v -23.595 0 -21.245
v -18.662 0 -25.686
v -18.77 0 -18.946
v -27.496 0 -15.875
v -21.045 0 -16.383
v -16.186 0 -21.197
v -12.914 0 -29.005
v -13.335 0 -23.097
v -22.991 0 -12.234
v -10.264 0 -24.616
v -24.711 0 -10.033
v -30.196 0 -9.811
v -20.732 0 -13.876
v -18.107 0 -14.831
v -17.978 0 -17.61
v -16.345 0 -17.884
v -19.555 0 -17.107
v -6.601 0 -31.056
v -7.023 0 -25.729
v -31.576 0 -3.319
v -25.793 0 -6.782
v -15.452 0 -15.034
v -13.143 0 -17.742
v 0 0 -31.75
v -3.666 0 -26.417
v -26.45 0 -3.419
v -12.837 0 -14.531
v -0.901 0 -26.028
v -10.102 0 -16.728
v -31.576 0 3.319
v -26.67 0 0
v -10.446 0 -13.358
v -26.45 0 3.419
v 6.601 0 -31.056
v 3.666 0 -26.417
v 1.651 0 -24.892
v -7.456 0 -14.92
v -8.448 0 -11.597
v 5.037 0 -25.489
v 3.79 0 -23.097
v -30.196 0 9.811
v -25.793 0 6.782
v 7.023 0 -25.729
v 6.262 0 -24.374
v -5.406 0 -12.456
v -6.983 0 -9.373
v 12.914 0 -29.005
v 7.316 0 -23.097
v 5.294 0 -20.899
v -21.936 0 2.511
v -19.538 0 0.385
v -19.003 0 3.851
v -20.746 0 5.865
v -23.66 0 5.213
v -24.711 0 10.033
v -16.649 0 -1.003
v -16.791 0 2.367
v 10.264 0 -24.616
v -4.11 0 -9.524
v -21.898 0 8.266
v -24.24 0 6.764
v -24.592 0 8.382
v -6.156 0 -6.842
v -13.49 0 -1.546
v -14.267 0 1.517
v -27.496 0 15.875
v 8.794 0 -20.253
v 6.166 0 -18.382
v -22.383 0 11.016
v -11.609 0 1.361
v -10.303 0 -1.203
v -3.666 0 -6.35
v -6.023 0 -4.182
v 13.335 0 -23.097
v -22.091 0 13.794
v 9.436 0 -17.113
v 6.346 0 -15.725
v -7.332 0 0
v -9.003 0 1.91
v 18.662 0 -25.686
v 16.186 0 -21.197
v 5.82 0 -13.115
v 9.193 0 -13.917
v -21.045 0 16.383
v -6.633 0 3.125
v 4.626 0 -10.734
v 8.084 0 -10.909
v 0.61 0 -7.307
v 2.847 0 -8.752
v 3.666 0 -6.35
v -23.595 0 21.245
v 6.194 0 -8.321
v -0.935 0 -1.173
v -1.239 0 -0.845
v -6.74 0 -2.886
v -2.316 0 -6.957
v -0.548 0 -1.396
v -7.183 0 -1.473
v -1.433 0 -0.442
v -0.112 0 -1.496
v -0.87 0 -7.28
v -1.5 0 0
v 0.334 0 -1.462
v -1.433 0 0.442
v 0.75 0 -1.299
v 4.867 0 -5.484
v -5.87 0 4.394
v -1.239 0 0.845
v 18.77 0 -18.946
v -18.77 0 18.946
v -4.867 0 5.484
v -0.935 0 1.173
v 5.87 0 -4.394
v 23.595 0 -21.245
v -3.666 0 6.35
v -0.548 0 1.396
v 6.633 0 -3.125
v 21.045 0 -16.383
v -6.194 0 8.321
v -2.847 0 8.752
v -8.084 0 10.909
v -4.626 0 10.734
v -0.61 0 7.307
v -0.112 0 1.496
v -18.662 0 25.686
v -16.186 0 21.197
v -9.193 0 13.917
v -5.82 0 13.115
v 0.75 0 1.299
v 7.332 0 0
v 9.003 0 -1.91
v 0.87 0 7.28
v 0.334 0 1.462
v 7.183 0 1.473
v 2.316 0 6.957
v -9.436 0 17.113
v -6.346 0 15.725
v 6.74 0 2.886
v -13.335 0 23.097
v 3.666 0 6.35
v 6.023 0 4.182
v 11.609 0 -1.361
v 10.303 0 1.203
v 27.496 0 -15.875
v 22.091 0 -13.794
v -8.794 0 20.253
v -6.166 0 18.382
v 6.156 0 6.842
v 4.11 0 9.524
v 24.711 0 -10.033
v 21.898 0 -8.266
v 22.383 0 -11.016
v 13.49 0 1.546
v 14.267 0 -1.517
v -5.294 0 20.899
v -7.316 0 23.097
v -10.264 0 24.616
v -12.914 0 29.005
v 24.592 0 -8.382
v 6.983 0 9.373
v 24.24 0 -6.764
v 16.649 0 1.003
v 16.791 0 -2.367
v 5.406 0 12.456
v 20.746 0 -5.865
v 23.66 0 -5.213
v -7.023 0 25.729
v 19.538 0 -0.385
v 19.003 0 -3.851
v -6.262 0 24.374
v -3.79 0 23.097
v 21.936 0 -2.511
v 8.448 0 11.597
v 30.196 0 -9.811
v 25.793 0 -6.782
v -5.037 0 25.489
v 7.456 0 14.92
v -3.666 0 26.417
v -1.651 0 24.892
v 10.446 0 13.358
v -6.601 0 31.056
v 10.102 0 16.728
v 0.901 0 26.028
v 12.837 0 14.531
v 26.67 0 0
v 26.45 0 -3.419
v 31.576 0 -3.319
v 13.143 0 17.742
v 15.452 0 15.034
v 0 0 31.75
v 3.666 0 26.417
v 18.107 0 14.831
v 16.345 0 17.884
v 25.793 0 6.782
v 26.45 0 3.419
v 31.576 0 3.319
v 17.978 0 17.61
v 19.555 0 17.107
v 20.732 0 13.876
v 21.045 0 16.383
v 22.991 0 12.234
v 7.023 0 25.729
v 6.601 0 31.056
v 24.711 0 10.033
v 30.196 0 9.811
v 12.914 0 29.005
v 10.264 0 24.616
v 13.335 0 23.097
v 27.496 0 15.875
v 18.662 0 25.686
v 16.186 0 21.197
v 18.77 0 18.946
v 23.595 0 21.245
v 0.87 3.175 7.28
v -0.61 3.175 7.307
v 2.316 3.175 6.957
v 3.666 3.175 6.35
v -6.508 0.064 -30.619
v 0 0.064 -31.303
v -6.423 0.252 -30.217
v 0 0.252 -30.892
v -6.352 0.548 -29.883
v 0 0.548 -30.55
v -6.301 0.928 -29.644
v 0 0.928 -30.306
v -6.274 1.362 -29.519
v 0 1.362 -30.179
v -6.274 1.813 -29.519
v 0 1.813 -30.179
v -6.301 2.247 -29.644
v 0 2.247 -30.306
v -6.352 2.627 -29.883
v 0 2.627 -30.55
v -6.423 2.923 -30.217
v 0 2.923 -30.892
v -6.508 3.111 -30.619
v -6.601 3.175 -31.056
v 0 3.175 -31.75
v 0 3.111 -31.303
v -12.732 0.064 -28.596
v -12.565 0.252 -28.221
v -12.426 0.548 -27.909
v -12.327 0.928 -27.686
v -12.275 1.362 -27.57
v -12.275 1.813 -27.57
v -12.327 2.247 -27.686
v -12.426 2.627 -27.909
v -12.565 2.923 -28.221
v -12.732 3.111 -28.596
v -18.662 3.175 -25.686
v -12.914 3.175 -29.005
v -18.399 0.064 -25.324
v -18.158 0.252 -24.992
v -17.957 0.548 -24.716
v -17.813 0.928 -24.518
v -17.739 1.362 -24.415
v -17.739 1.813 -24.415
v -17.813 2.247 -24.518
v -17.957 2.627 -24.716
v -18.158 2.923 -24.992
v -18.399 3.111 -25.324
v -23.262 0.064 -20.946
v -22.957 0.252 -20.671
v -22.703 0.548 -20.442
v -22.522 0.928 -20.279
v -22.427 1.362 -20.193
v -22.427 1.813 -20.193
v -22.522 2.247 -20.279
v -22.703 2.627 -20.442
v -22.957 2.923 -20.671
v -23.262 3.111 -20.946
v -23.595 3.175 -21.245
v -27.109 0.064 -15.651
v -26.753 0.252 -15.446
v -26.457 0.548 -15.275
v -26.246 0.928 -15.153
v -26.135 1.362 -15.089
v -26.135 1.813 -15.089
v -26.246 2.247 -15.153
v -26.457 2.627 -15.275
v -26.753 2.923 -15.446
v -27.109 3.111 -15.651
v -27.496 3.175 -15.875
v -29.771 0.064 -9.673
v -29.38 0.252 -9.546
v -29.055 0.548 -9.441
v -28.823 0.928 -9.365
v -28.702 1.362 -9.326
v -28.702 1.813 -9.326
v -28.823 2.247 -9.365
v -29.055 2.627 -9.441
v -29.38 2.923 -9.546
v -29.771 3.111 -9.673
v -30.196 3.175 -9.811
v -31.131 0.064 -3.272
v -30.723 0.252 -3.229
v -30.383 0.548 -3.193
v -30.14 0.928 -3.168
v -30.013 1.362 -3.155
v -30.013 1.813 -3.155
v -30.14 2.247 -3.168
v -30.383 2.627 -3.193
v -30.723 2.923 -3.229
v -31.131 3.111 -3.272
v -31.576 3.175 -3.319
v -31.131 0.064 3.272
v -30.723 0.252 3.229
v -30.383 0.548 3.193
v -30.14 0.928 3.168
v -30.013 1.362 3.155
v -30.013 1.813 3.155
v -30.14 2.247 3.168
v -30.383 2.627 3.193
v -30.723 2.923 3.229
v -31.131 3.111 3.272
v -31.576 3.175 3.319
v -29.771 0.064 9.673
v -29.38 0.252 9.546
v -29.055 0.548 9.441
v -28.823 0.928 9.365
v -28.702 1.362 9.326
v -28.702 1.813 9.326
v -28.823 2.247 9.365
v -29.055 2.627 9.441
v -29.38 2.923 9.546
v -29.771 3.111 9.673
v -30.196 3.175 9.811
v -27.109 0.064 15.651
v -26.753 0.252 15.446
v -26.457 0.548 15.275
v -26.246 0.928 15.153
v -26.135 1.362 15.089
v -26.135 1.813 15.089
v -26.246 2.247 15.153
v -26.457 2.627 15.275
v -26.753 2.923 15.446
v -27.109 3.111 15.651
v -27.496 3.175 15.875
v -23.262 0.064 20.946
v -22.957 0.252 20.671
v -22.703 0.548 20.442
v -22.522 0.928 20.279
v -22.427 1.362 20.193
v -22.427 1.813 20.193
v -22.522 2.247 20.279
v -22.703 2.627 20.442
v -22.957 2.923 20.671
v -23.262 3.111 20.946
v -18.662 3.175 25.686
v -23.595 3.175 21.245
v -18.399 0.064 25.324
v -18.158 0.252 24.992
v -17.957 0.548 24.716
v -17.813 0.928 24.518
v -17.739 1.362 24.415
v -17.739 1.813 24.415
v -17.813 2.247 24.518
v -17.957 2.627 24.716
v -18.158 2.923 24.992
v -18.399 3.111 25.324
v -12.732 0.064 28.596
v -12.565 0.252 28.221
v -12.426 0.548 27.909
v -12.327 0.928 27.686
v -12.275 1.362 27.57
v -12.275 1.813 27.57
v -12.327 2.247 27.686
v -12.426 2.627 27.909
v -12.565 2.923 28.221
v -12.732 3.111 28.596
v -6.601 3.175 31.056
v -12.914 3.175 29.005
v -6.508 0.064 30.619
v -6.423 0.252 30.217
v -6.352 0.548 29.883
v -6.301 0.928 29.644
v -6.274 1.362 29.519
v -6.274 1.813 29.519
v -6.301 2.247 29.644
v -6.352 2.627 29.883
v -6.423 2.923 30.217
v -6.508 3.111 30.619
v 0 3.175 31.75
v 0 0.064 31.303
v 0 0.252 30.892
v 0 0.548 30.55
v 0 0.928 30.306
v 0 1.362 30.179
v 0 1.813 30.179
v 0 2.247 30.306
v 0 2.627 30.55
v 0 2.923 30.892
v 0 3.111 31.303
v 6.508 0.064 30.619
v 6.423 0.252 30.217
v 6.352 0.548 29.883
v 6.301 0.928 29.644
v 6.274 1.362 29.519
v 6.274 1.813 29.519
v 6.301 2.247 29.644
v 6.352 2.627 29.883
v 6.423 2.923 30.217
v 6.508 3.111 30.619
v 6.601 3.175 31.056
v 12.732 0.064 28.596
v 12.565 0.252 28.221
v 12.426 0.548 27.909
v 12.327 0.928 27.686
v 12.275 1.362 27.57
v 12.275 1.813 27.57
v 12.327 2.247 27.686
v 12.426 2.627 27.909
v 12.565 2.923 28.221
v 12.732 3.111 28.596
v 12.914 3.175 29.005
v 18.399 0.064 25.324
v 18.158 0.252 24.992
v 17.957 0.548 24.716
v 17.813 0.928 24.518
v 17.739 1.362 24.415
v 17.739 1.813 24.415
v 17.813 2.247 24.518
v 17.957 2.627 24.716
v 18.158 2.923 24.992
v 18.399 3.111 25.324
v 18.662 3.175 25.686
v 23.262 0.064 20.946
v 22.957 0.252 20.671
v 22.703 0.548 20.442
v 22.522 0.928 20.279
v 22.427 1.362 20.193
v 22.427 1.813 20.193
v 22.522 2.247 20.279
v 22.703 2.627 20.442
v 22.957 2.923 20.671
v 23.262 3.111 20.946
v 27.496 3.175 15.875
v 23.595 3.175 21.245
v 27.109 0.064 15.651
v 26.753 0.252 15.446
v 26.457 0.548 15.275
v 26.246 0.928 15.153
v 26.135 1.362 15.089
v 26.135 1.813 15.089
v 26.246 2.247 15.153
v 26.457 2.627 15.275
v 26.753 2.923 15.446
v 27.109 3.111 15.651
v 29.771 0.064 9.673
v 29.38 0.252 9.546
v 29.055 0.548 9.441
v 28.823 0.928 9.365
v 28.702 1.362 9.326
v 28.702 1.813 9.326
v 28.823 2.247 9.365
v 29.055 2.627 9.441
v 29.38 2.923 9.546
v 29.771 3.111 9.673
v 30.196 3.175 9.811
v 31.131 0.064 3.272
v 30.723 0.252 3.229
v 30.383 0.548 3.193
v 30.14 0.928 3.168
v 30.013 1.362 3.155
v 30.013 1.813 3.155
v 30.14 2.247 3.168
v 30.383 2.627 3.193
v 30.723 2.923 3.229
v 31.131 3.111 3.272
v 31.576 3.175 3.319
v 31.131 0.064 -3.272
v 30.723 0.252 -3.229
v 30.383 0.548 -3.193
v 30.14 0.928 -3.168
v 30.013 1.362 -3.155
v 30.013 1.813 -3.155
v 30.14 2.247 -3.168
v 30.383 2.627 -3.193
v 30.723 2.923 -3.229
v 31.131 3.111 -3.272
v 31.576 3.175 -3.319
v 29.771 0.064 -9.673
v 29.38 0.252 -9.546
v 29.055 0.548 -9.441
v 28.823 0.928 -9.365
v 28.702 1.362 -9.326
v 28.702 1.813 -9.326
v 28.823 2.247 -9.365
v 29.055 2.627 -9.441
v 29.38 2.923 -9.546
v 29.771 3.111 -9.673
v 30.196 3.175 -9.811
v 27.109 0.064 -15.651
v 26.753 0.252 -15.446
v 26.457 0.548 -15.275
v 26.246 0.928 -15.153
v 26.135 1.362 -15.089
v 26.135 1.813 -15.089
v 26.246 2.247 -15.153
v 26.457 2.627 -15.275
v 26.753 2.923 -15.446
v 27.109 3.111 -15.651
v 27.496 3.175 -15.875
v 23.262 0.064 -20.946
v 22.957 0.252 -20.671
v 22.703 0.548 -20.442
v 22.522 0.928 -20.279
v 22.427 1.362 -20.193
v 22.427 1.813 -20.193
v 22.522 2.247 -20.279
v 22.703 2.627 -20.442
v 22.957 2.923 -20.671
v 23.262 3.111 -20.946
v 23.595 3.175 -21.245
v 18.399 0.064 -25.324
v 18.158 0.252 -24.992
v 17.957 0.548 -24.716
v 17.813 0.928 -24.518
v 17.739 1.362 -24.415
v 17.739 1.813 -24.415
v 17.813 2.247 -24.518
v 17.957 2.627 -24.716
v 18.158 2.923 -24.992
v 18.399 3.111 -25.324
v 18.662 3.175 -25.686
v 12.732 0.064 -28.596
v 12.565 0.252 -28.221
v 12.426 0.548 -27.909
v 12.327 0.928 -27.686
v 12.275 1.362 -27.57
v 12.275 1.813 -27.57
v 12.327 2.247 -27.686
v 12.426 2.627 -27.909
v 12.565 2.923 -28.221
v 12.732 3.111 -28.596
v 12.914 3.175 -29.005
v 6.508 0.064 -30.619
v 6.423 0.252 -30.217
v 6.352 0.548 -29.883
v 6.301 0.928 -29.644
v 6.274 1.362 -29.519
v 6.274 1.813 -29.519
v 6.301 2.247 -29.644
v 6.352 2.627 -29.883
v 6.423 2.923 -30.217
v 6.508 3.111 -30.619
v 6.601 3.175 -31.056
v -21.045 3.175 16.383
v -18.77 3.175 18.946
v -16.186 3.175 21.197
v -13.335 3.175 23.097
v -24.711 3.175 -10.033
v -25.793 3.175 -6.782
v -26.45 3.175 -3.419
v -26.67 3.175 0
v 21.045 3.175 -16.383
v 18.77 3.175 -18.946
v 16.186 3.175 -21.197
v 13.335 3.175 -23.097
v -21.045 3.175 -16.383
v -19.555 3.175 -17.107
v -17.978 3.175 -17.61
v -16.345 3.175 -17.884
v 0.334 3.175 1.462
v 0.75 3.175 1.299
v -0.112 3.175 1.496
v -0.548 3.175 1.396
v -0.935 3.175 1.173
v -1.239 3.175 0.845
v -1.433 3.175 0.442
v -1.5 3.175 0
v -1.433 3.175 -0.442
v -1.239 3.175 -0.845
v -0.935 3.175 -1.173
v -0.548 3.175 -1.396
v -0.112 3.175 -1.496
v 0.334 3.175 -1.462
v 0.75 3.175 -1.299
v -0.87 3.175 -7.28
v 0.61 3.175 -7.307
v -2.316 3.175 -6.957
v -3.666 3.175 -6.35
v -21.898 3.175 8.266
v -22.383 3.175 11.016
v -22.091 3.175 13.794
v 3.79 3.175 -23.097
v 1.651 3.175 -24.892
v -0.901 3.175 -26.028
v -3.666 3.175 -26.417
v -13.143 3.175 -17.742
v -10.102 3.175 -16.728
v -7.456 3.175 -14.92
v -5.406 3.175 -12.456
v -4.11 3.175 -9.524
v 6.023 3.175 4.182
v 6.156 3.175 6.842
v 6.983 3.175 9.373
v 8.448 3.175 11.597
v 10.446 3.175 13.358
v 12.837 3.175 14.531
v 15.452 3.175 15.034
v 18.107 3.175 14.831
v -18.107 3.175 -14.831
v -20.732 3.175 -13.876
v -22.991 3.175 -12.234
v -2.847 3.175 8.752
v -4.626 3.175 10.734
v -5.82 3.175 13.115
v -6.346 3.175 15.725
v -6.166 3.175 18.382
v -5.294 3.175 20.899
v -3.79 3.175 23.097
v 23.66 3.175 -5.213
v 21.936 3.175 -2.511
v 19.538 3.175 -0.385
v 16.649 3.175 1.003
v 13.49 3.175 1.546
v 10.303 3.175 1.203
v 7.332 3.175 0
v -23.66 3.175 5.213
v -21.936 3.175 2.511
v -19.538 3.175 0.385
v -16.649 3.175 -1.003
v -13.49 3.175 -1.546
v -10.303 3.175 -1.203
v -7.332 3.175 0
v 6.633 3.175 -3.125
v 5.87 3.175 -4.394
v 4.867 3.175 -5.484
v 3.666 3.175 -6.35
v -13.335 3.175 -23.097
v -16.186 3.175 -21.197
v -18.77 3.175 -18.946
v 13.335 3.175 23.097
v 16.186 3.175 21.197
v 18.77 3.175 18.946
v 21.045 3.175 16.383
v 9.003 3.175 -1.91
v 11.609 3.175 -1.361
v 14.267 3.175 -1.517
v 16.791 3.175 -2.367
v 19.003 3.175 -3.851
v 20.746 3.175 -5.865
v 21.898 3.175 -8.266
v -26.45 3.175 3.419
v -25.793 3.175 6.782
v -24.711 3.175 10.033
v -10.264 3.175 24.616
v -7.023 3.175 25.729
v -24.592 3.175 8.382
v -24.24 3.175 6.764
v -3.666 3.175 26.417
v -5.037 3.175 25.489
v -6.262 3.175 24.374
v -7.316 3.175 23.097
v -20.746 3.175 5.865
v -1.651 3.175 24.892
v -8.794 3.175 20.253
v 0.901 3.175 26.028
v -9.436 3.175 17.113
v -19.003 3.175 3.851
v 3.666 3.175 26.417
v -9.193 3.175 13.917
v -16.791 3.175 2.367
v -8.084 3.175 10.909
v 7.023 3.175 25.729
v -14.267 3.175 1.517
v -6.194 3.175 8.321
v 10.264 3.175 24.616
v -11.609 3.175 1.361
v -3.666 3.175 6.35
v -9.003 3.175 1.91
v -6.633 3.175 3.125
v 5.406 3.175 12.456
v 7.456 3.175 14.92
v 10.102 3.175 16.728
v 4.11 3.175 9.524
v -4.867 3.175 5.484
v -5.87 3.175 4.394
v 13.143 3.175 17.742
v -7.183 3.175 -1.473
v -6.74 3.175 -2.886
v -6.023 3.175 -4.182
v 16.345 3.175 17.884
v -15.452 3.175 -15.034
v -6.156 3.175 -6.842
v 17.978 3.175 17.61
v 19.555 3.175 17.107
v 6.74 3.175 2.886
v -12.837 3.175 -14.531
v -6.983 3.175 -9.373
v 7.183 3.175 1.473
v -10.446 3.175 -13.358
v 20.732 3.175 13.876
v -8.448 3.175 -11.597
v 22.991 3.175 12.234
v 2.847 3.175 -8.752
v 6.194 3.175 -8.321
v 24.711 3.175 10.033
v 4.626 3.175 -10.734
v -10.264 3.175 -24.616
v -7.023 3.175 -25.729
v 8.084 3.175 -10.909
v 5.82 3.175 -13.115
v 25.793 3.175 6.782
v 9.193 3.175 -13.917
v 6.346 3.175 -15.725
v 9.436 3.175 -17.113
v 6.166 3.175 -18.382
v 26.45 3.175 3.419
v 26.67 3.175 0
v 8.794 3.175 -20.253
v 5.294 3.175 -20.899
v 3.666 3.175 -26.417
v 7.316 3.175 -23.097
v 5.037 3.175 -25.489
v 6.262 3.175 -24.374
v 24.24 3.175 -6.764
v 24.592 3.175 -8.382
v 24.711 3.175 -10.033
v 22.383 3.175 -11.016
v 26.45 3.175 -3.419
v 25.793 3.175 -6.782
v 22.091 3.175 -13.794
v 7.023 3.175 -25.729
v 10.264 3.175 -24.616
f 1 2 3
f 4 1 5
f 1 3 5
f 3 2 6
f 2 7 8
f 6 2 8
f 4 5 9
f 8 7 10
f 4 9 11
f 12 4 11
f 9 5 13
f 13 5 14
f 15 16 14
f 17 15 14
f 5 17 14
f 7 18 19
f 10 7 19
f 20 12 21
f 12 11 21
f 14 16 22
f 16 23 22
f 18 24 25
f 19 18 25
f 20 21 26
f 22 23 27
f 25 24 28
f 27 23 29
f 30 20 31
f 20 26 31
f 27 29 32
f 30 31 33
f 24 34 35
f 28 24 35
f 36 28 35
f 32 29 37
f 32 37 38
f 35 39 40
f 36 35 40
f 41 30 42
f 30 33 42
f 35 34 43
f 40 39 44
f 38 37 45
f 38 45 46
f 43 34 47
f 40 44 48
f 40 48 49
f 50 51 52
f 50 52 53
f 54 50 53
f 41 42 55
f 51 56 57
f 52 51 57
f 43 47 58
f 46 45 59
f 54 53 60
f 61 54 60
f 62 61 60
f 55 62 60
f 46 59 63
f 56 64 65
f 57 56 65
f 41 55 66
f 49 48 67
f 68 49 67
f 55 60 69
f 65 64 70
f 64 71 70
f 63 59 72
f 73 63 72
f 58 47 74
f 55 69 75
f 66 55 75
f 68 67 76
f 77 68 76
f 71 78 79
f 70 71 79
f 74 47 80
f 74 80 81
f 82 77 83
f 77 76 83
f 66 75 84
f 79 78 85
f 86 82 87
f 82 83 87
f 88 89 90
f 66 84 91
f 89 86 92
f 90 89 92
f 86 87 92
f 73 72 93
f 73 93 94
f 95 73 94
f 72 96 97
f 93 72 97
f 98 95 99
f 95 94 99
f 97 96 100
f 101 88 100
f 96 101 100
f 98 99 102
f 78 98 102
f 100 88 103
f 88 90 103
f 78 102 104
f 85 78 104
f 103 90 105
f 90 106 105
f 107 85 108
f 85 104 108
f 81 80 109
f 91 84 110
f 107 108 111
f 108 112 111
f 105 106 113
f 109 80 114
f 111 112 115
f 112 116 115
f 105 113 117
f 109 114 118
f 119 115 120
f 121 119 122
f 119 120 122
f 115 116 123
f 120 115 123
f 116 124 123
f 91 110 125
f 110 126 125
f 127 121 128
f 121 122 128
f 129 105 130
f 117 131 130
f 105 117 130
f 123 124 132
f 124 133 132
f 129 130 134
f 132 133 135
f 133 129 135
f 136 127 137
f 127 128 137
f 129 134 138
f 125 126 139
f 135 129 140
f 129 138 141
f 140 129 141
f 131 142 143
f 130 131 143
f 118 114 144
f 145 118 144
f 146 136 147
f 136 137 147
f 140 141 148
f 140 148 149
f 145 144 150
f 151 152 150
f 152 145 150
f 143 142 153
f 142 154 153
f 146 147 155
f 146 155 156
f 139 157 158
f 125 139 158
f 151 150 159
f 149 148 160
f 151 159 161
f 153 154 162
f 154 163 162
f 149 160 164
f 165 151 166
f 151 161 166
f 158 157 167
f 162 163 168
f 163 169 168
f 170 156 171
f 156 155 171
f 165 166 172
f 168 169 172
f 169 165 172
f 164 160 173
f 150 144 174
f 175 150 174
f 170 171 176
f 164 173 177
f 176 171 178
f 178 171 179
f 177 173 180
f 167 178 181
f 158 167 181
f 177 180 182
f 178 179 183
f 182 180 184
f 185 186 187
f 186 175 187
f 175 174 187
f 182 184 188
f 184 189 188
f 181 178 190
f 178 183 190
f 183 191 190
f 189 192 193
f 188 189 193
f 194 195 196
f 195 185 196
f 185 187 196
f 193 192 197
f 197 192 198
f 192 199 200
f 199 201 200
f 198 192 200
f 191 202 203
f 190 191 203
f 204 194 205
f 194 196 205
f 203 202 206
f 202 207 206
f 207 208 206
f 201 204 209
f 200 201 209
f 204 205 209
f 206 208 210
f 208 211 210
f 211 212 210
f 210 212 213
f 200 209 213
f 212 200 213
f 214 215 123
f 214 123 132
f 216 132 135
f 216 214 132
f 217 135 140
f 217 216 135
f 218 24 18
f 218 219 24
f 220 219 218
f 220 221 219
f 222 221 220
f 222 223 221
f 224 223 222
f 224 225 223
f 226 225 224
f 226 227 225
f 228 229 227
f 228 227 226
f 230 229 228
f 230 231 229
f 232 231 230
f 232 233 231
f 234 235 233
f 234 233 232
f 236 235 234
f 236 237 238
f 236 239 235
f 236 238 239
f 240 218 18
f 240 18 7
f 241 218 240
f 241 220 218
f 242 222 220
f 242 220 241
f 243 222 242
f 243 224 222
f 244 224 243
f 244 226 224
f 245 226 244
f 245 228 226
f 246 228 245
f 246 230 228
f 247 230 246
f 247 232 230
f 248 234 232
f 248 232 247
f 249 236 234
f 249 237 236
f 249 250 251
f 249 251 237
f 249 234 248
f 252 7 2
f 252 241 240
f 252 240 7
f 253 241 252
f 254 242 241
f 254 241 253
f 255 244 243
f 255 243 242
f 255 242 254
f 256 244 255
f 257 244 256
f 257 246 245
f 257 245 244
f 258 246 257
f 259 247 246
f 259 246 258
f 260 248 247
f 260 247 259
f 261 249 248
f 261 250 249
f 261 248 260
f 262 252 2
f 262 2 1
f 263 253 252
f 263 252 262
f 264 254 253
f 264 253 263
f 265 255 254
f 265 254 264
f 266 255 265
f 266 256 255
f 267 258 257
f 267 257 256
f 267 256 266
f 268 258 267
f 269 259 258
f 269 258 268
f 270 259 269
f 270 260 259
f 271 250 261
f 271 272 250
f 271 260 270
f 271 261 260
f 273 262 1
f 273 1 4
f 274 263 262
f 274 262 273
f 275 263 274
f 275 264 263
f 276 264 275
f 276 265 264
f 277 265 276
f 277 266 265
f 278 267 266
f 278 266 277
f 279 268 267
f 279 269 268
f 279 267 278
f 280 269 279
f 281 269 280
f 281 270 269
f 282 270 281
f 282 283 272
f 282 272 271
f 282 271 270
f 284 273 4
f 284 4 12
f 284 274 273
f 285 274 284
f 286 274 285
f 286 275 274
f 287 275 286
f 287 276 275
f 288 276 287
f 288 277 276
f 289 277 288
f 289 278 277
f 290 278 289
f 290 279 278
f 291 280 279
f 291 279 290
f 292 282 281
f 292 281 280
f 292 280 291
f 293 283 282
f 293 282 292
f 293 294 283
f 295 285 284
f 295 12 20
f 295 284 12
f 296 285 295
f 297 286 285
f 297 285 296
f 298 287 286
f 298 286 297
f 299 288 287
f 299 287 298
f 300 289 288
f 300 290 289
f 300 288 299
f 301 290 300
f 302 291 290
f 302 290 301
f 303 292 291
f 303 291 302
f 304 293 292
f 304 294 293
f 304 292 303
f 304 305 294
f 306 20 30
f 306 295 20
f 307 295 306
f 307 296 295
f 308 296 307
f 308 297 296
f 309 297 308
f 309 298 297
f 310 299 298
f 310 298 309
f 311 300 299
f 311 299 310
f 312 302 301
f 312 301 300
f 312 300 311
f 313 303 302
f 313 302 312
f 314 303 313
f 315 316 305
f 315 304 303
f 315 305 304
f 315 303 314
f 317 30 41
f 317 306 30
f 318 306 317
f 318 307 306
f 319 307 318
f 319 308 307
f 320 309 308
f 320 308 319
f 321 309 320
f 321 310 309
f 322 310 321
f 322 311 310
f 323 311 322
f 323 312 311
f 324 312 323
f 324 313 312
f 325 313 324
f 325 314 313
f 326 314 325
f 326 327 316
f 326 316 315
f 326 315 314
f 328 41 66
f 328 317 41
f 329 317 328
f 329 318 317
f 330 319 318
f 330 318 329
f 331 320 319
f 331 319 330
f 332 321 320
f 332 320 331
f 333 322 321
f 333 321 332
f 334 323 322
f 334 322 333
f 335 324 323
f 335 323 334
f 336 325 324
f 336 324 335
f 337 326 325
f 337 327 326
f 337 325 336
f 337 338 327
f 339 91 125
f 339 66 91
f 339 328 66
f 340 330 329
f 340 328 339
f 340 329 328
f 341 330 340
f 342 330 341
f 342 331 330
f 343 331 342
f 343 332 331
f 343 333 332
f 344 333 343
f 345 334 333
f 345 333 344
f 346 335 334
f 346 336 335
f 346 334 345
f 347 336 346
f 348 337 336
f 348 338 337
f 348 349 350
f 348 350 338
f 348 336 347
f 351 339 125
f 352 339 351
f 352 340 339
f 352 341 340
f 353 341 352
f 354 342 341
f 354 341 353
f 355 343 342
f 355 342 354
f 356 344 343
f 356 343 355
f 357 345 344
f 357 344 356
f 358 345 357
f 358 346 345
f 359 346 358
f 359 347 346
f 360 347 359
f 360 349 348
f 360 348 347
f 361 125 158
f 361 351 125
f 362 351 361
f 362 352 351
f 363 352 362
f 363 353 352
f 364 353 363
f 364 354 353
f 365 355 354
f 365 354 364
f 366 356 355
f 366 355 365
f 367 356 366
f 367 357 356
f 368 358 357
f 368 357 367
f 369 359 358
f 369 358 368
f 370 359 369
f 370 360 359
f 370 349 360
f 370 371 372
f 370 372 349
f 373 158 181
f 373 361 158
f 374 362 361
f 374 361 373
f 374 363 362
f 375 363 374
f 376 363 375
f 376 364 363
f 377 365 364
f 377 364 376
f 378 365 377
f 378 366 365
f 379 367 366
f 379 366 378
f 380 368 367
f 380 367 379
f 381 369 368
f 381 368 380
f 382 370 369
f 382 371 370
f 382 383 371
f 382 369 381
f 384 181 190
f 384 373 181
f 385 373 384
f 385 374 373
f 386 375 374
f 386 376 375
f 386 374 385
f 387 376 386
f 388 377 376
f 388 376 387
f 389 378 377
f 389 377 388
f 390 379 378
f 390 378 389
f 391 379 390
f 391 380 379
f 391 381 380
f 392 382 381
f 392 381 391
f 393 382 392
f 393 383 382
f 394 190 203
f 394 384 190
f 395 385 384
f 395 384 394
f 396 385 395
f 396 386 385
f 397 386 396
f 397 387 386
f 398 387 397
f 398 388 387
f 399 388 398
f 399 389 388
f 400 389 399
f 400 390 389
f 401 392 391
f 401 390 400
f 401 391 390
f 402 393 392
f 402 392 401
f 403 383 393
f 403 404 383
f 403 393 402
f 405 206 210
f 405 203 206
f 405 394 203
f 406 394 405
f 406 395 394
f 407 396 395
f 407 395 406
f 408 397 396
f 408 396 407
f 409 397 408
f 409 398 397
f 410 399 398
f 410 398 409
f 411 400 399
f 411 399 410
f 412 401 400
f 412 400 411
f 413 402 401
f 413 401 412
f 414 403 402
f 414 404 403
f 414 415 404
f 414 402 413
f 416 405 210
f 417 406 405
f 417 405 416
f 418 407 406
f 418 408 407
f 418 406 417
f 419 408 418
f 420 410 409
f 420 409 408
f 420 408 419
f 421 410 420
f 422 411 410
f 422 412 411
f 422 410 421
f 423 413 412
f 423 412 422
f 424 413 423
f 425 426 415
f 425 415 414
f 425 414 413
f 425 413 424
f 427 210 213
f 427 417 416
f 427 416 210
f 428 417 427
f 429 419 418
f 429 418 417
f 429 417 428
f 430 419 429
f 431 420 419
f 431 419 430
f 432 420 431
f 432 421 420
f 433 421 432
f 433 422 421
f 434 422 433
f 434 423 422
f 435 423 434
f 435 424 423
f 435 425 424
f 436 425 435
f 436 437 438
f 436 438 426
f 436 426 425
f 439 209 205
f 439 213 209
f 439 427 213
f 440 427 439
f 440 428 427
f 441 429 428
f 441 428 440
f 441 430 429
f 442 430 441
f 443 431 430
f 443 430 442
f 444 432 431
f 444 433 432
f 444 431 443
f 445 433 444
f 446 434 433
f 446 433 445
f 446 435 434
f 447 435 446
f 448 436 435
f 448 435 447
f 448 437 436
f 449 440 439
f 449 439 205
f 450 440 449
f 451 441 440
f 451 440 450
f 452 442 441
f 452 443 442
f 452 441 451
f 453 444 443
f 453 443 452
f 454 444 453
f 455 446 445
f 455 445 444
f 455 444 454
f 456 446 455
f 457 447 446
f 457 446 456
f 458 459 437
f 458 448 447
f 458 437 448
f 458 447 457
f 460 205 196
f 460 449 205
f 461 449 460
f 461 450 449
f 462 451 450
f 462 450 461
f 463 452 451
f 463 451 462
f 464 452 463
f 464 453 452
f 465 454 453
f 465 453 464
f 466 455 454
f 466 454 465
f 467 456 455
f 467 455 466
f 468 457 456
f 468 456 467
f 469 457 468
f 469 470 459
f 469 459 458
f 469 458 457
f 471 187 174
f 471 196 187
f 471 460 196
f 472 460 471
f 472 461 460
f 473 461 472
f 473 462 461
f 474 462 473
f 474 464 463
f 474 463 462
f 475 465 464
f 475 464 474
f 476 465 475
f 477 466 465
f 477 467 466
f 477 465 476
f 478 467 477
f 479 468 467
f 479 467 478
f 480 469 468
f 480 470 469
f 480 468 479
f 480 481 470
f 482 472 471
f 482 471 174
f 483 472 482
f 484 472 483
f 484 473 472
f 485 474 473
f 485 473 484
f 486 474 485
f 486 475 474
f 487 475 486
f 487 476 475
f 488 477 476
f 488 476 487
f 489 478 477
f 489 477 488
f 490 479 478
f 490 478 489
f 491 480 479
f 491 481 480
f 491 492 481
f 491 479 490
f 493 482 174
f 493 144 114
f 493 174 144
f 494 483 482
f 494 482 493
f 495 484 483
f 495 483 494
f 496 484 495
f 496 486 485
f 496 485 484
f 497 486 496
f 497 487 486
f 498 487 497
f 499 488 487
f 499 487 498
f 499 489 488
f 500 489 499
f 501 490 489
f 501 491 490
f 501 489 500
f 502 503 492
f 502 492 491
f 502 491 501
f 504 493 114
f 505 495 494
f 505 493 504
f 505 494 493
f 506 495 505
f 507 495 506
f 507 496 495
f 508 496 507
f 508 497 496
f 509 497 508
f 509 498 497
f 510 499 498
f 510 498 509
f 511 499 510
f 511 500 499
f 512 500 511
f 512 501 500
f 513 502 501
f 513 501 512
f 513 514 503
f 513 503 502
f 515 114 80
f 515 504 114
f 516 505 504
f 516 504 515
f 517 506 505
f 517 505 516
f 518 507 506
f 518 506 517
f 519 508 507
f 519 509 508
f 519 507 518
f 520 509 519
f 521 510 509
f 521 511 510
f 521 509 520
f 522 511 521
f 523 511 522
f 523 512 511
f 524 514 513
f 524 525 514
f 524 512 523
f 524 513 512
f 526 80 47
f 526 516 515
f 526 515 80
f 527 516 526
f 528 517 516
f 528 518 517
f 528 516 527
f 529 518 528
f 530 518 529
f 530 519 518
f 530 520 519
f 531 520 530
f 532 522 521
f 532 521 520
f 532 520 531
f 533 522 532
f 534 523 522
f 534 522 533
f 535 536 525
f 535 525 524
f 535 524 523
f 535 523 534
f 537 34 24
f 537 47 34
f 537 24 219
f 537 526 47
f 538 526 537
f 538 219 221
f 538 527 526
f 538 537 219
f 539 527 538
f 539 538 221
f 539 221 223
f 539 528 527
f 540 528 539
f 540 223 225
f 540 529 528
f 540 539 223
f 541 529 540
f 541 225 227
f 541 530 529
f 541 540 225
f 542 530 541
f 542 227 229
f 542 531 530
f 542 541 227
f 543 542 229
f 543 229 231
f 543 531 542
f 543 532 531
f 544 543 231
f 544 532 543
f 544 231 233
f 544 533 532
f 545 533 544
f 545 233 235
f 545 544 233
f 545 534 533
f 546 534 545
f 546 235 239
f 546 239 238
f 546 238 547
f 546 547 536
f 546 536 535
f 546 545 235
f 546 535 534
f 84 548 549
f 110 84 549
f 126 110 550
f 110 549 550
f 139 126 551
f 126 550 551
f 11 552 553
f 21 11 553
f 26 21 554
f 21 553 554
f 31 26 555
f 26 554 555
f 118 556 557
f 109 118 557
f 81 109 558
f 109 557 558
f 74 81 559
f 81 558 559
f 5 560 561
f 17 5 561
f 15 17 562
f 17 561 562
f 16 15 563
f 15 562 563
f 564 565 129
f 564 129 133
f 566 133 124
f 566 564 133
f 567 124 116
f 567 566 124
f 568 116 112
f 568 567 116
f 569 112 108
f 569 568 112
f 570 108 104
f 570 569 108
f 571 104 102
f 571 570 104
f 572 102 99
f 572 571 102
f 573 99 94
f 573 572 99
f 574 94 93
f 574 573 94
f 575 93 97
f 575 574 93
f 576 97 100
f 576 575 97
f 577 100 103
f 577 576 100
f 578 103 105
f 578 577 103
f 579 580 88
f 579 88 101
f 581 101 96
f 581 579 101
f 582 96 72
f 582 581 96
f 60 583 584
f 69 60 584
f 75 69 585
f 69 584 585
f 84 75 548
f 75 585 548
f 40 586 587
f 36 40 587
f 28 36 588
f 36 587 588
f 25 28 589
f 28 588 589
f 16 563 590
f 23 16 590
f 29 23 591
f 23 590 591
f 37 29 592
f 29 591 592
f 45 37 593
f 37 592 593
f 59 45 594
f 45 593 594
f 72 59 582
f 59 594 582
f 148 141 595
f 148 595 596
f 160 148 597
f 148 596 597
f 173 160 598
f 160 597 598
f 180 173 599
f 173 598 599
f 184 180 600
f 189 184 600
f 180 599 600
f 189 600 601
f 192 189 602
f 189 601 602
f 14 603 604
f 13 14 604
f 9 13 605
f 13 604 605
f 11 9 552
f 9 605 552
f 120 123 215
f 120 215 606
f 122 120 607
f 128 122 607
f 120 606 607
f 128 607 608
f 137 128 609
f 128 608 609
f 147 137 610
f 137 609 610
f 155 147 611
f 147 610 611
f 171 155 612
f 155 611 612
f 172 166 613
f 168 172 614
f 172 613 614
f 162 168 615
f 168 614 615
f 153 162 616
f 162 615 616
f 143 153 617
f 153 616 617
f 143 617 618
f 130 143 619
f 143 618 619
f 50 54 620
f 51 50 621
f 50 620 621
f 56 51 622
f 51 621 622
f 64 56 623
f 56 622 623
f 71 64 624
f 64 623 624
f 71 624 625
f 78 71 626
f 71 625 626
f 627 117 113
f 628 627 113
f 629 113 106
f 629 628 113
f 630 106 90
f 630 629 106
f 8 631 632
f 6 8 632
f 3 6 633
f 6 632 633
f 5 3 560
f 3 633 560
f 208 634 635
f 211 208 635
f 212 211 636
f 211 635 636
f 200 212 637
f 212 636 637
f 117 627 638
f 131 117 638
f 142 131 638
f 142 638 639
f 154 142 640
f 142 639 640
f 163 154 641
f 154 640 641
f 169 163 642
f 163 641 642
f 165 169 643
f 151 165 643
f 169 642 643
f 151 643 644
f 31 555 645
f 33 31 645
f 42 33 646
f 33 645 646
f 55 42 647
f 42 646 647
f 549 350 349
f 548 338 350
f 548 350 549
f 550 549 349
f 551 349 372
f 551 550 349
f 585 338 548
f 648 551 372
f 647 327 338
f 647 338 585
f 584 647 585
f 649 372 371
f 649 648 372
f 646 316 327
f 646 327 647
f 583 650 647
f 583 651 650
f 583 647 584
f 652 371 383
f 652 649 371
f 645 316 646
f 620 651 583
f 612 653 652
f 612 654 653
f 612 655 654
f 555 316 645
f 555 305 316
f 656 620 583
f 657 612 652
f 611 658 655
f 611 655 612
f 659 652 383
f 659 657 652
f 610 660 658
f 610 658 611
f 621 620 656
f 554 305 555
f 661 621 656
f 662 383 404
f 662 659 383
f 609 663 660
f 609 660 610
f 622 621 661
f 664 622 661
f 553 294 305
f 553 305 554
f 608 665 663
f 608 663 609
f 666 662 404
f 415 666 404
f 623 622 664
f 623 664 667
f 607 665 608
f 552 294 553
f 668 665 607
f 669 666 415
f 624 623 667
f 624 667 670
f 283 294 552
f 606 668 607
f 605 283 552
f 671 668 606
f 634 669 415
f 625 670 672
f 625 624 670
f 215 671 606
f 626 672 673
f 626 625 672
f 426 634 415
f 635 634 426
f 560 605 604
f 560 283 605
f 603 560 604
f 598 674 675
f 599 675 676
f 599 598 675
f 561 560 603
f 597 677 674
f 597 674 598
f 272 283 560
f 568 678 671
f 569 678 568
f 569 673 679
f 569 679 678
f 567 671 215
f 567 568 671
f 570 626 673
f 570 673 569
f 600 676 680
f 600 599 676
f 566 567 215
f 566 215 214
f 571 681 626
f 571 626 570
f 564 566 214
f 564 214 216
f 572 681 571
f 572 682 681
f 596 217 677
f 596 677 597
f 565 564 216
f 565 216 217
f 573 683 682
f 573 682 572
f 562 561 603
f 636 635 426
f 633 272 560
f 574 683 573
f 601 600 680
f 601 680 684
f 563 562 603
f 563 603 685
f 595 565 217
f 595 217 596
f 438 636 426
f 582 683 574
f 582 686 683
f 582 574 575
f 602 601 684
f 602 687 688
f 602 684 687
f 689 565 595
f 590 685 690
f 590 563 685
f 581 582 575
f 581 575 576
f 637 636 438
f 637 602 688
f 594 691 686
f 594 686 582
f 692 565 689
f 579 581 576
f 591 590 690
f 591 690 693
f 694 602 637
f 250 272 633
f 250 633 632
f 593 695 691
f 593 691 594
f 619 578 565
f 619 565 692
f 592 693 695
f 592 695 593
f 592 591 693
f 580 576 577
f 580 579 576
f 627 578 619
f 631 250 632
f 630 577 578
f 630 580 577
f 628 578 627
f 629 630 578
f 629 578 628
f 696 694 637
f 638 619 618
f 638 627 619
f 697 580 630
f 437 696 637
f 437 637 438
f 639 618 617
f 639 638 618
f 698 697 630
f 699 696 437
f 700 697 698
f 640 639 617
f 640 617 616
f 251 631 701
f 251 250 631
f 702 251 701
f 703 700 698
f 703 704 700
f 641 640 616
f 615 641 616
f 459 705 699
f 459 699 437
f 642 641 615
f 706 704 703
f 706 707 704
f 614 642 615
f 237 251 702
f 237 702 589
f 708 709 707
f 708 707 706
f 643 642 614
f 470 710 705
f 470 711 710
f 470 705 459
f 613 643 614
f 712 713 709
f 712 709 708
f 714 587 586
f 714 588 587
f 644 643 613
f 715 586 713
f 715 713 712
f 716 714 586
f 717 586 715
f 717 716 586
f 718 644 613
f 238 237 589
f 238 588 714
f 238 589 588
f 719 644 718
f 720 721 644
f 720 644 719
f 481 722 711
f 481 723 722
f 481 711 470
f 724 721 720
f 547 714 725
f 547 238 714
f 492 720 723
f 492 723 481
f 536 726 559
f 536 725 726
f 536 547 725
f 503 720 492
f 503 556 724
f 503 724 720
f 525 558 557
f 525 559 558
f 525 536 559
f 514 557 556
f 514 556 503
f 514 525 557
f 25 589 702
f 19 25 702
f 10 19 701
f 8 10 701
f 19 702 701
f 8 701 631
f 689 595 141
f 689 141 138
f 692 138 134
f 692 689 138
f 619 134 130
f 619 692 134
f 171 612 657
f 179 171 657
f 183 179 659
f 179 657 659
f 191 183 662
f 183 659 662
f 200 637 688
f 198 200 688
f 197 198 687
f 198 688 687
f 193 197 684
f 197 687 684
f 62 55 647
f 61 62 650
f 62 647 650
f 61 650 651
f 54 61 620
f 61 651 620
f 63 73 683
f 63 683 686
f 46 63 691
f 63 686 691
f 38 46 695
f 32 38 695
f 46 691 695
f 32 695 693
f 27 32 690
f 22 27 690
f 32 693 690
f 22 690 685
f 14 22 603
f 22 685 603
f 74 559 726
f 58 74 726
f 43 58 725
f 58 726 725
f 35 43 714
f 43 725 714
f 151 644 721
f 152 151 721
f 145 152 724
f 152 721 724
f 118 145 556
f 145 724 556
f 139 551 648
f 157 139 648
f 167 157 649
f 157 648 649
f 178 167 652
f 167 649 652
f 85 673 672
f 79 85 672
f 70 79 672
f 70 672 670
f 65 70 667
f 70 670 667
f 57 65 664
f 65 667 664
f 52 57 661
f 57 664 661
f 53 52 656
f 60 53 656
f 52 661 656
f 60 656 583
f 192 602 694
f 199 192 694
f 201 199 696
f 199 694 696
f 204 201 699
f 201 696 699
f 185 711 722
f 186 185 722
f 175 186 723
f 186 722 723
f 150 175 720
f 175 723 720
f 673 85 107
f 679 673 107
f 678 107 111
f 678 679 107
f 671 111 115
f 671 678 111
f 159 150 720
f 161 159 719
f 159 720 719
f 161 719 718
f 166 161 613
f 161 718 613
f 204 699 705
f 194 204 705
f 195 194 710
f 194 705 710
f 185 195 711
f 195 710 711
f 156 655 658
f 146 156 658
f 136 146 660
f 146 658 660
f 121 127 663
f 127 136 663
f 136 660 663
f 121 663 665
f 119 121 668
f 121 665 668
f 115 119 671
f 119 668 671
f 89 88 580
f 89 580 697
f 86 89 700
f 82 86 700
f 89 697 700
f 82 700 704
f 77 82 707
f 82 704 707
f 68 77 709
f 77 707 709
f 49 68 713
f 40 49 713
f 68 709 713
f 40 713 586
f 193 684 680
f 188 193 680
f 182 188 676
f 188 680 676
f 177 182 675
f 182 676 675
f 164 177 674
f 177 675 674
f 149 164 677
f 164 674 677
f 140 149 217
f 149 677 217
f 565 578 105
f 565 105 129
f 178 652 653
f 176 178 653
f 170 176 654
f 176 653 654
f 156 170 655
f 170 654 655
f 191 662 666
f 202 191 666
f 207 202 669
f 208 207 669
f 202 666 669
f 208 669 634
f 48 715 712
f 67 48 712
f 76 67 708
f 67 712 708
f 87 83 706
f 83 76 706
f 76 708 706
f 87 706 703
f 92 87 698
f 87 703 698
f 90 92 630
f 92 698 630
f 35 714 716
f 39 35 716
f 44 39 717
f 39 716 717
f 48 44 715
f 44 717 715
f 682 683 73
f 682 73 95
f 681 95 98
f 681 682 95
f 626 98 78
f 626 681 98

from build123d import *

# Parameters (mm, degrees)
SKETCH1_R           = 31.75
BOSS_EXTRUDE1_DEPTH = 3.175
SKETCH2_R           = 1.5875
CUT_EXTRUDE1_DEPTH  = 46.01339384
SKETCH6_R           = 7.332348419
BOSS_EXTRUDE2_DEPTH = 3.175
CUT_EXTRUDE2_DEPTH  = 46.01339384


with BuildPart() as part:
    # Sketch1 → Boss-Extrude1 (new body)
    with BuildSketch(Plane(origin=(0, 0, 0), x_dir=(1, 0, 0), z_dir=(0, 1, 0))):
        with Locations(Location((0, 0, 0), (0, 0, 270))):
            Circle(SKETCH1_R)
    extrude(amount=BOSS_EXTRUDE1_DEPTH)

    # Sketch2 → Cut-Revolve1 (revolve, cut)
    with BuildSketch(Plane.XY, mode=Mode.PRIVATE) as cut_revolve1_sk:
        with Locations((-31.75, 1.5875)):
            Circle(SKETCH2_R)
    revolve(cut_revolve1_sk.sketch.rotate(Axis((0, 0, 0), (0, 1, 0)), 270), axis=Axis((0, 0, 0), (0, 1, 0)), mode=Mode.SUBTRACT)

    # Sketch5 → Cut-Extrude1 (cut, through all)
    with BuildSketch(Plane(origin=(0, 3.175, 0), x_dir=(1, 0, 0), z_dir=(0, 1, 0))):
        with BuildLine():
            ThreePointArc((-23.660280874, -5.212986442), (-16.648813235, 1.003322249), (-7.332348419, 0))
            ThreePointArc((-7.332348419, 0), (-7.904270057, 10.91410008), (-18.107373639, 14.830903904))
            Line((-18.107373639, 14.830903904), (-26.67, 0))
            Line((-26.67, 0), (-23.660280874, -5.212986442))
        make_face()
        with BuildLine():
            ThreePointArc((-7.315561749, -23.096897519), (-9.193309174, -13.91663408), (-3.666174209, -6.35))
            ThreePointArc((-3.666174209, -6.35), (-13.404022957, -1.388248628), (-21.897626361, -8.265993615))
            Line((-21.897626361, -8.265993615), (-13.335, -23.096897519))
            Line((-13.335, -23.096897519), (-7.315561749, -23.096897519))
        make_face()
        with BuildLine():
            ThreePointArc((16.344719126, -17.883911077), (7.455504061, -14.919956329), (3.666174209, -6.35))
            ThreePointArc((3.666174209, -6.35), (-5.4997529, -12.302348707), (-3.790252722, -23.096897519))
            Line((-3.790252722, -23.096897519), (13.335, -23.096897519))
            Line((13.335, -23.096897519), (16.344719126, -17.883911077))
        make_face()
        with BuildLine():
            ThreePointArc((23.660280874, 5.212986442), (16.648813235, -1.003322249), (7.332348419, 0))
            ThreePointArc((7.332348419, 0), (7.904270057, -10.91410008), (18.107373639, -14.830903904))
            Line((18.107373639, -14.830903904), (26.67, 0))
            Line((26.67, 0), (23.660280874, 5.212986442))
        make_face()
        with BuildLine():
            ThreePointArc((7.315561749, 23.096897519), (9.193309174, 13.91663408), (3.666174209, 6.35))
            ThreePointArc((3.666174209, 6.35), (13.404022957, 1.388248628), (21.897626361, 8.265993615))
            Line((21.897626361, 8.265993615), (13.335, 23.096897519))
            Line((13.335, 23.096897519), (7.315561749, 23.096897519))
        make_face()
        with BuildLine():
            ThreePointArc((-16.344719126, 17.883911077), (-7.455504061, 14.919956329), (-3.666174209, 6.35))
            ThreePointArc((-3.666174209, 6.35), (5.4997529, 12.302348707), (3.790252722, 23.096897519))
            Line((3.790252722, 23.096897519), (-13.335, 23.096897519))
            Line((-13.335, 23.096897519), (-16.344719126, 17.883911077))
        make_face()
        with BuildLine():
            ThreePointArc((-21.044544984, 16.383407045), (-18.775429284, 17.386729294), (-16.344719126, 17.883911077))
            Line((-16.344719126, 17.883911077), (-13.335, 23.096897519))
            ThreePointArc((-13.335, 23.096897519), (-17.514451659, 20.113002836), (-21.044544984, 16.383407045))
        make_face()
        with BuildLine():
            Line((-13.335, 23.096897519), (3.790252722, 23.096897519))
            ThreePointArc((3.790252722, 23.096897519), (0.414884128, 25.549334154), (-3.666174209, 26.41681409))
            ThreePointArc((-3.666174209, 26.41681409), (-8.661145573, 25.224461488), (-13.335, 23.096897519))
        make_face()
        with BuildLine():
            ThreePointArc((3.666174209, 26.41681409), (5.669634616, 24.953363374), (7.315561749, 23.096897519))
            Line((7.315561749, 23.096897519), (13.335, 23.096897519))
            ThreePointArc((13.335, 23.096897519), (8.661145573, 25.224461488), (3.666174209, 26.41681409))
        make_face()
        with BuildLine():
            Line((13.335, 23.096897519), (21.897626361, 8.265993615))
            ThreePointArc((21.897626361, 8.265993615), (22.333814492, 12.415366882), (21.044544984, 16.383407045))
            ThreePointArc((21.044544984, 16.383407045), (17.514451659, 20.113002836), (13.335, 23.096897519))
        make_face()
        with BuildLine():
            ThreePointArc((24.710719194, 10.033407045), (24.4450639, 7.56663408), (23.660280874, 5.212986442))
            Line((23.660280874, 5.212986442), (26.67, 0))
            ThreePointArc((26.67, 0), (26.175597232, 5.111458652), (24.710719194, 10.033407045))
        make_face()
        with BuildLine():
            ThreePointArc((21.044544984, -16.383407045), (18.775429284, -17.386729294), (16.344719126, -17.883911077))
            Line((16.344719126, -17.883911077), (13.335, -23.096897519))
            ThreePointArc((13.335, -23.096897519), (17.514451659, -20.113002836), (21.044544984, -16.383407045))
        make_face()
        with BuildLine():
            Line((13.335, -23.096897519), (-3.790252722, -23.096897519))
            ThreePointArc((-3.790252722, -23.096897519), (-0.414884128, -25.549334154), (3.666174209, -26.41681409))
            ThreePointArc((3.666174209, -26.41681409), (8.661145573, -25.224461488), (13.335, -23.096897519))
        make_face()
        with BuildLine():
            ThreePointArc((-3.666174209, -26.41681409), (-5.669634616, -24.953363374), (-7.315561749, -23.096897519))
            Line((-7.315561749, -23.096897519), (-13.335, -23.096897519))
            ThreePointArc((-13.335, -23.096897519), (-8.661145573, -25.224461488), (-3.666174209, -26.41681409))
        make_face()
        with BuildLine():
            Line((-13.335, -23.096897519), (-21.897626361, -8.265993615))
            ThreePointArc((-21.897626361, -8.265993615), (-22.333814492, -12.415366882), (-21.044544984, -16.383407045))
            ThreePointArc((-21.044544984, -16.383407045), (-17.514451659, -20.113002836), (-13.335, -23.096897519))
        make_face()
        with BuildLine():
            ThreePointArc((-24.710719194, -10.033407045), (-24.4450639, -7.56663408), (-23.660280874, -5.212986442))
            Line((-23.660280874, -5.212986442), (-26.67, 0))
            ThreePointArc((-26.67, 0), (-26.175597232, -5.111458652), (-24.710719194, -10.033407045))
        make_face()
        with BuildLine():
            Line((-26.67, 0), (-18.107373639, 14.830903904))
            ThreePointArc((-18.107373639, 14.830903904), (-21.918930363, 13.133967272), (-24.710719194, 10.033407045))
            ThreePointArc((-24.710719194, 10.033407045), (-26.175597232, 5.111458652), (-26.67, 0))
        make_face()
        with BuildLine():
            Line((26.67, 0), (18.107373639, -14.830903904))
            ThreePointArc((18.107373639, -14.830903904), (21.918930363, -13.133967272), (24.710719194, -10.033407045))
            ThreePointArc((24.710719194, -10.033407045), (26.175597232, -5.111458652), (26.67, 0))
        make_face()
    extrude(amount=-CUT_EXTRUDE1_DEPTH, mode=Mode.SUBTRACT)

    # Sketch6 → Boss-Extrude2 (add)
    with BuildSketch(Plane(origin=(0, 3.175, 0), x_dir=(1, 0, 0), z_dir=(0, 1, 0))):
        Circle(SKETCH6_R)
    extrude(amount=-BOSS_EXTRUDE2_DEPTH)

    # Sketch7 → Cut-Extrude2 (cut, through all)
    with BuildSketch(Plane(origin=(0, 3.175, 0), x_dir=(1, 0, 0), z_dir=(0, 1, 0))):
        with BuildLine():
            Line((0.75, 1.299038106), (0.75, -1.299038106))
            ThreePointArc((0.75, -1.299038106), (-1.5, 0), (0.75, 1.299038106))
        make_face()
    extrude(amount=-CUT_EXTRUDE2_DEPTH, mode=Mode.SUBTRACT)


solid = part.part
